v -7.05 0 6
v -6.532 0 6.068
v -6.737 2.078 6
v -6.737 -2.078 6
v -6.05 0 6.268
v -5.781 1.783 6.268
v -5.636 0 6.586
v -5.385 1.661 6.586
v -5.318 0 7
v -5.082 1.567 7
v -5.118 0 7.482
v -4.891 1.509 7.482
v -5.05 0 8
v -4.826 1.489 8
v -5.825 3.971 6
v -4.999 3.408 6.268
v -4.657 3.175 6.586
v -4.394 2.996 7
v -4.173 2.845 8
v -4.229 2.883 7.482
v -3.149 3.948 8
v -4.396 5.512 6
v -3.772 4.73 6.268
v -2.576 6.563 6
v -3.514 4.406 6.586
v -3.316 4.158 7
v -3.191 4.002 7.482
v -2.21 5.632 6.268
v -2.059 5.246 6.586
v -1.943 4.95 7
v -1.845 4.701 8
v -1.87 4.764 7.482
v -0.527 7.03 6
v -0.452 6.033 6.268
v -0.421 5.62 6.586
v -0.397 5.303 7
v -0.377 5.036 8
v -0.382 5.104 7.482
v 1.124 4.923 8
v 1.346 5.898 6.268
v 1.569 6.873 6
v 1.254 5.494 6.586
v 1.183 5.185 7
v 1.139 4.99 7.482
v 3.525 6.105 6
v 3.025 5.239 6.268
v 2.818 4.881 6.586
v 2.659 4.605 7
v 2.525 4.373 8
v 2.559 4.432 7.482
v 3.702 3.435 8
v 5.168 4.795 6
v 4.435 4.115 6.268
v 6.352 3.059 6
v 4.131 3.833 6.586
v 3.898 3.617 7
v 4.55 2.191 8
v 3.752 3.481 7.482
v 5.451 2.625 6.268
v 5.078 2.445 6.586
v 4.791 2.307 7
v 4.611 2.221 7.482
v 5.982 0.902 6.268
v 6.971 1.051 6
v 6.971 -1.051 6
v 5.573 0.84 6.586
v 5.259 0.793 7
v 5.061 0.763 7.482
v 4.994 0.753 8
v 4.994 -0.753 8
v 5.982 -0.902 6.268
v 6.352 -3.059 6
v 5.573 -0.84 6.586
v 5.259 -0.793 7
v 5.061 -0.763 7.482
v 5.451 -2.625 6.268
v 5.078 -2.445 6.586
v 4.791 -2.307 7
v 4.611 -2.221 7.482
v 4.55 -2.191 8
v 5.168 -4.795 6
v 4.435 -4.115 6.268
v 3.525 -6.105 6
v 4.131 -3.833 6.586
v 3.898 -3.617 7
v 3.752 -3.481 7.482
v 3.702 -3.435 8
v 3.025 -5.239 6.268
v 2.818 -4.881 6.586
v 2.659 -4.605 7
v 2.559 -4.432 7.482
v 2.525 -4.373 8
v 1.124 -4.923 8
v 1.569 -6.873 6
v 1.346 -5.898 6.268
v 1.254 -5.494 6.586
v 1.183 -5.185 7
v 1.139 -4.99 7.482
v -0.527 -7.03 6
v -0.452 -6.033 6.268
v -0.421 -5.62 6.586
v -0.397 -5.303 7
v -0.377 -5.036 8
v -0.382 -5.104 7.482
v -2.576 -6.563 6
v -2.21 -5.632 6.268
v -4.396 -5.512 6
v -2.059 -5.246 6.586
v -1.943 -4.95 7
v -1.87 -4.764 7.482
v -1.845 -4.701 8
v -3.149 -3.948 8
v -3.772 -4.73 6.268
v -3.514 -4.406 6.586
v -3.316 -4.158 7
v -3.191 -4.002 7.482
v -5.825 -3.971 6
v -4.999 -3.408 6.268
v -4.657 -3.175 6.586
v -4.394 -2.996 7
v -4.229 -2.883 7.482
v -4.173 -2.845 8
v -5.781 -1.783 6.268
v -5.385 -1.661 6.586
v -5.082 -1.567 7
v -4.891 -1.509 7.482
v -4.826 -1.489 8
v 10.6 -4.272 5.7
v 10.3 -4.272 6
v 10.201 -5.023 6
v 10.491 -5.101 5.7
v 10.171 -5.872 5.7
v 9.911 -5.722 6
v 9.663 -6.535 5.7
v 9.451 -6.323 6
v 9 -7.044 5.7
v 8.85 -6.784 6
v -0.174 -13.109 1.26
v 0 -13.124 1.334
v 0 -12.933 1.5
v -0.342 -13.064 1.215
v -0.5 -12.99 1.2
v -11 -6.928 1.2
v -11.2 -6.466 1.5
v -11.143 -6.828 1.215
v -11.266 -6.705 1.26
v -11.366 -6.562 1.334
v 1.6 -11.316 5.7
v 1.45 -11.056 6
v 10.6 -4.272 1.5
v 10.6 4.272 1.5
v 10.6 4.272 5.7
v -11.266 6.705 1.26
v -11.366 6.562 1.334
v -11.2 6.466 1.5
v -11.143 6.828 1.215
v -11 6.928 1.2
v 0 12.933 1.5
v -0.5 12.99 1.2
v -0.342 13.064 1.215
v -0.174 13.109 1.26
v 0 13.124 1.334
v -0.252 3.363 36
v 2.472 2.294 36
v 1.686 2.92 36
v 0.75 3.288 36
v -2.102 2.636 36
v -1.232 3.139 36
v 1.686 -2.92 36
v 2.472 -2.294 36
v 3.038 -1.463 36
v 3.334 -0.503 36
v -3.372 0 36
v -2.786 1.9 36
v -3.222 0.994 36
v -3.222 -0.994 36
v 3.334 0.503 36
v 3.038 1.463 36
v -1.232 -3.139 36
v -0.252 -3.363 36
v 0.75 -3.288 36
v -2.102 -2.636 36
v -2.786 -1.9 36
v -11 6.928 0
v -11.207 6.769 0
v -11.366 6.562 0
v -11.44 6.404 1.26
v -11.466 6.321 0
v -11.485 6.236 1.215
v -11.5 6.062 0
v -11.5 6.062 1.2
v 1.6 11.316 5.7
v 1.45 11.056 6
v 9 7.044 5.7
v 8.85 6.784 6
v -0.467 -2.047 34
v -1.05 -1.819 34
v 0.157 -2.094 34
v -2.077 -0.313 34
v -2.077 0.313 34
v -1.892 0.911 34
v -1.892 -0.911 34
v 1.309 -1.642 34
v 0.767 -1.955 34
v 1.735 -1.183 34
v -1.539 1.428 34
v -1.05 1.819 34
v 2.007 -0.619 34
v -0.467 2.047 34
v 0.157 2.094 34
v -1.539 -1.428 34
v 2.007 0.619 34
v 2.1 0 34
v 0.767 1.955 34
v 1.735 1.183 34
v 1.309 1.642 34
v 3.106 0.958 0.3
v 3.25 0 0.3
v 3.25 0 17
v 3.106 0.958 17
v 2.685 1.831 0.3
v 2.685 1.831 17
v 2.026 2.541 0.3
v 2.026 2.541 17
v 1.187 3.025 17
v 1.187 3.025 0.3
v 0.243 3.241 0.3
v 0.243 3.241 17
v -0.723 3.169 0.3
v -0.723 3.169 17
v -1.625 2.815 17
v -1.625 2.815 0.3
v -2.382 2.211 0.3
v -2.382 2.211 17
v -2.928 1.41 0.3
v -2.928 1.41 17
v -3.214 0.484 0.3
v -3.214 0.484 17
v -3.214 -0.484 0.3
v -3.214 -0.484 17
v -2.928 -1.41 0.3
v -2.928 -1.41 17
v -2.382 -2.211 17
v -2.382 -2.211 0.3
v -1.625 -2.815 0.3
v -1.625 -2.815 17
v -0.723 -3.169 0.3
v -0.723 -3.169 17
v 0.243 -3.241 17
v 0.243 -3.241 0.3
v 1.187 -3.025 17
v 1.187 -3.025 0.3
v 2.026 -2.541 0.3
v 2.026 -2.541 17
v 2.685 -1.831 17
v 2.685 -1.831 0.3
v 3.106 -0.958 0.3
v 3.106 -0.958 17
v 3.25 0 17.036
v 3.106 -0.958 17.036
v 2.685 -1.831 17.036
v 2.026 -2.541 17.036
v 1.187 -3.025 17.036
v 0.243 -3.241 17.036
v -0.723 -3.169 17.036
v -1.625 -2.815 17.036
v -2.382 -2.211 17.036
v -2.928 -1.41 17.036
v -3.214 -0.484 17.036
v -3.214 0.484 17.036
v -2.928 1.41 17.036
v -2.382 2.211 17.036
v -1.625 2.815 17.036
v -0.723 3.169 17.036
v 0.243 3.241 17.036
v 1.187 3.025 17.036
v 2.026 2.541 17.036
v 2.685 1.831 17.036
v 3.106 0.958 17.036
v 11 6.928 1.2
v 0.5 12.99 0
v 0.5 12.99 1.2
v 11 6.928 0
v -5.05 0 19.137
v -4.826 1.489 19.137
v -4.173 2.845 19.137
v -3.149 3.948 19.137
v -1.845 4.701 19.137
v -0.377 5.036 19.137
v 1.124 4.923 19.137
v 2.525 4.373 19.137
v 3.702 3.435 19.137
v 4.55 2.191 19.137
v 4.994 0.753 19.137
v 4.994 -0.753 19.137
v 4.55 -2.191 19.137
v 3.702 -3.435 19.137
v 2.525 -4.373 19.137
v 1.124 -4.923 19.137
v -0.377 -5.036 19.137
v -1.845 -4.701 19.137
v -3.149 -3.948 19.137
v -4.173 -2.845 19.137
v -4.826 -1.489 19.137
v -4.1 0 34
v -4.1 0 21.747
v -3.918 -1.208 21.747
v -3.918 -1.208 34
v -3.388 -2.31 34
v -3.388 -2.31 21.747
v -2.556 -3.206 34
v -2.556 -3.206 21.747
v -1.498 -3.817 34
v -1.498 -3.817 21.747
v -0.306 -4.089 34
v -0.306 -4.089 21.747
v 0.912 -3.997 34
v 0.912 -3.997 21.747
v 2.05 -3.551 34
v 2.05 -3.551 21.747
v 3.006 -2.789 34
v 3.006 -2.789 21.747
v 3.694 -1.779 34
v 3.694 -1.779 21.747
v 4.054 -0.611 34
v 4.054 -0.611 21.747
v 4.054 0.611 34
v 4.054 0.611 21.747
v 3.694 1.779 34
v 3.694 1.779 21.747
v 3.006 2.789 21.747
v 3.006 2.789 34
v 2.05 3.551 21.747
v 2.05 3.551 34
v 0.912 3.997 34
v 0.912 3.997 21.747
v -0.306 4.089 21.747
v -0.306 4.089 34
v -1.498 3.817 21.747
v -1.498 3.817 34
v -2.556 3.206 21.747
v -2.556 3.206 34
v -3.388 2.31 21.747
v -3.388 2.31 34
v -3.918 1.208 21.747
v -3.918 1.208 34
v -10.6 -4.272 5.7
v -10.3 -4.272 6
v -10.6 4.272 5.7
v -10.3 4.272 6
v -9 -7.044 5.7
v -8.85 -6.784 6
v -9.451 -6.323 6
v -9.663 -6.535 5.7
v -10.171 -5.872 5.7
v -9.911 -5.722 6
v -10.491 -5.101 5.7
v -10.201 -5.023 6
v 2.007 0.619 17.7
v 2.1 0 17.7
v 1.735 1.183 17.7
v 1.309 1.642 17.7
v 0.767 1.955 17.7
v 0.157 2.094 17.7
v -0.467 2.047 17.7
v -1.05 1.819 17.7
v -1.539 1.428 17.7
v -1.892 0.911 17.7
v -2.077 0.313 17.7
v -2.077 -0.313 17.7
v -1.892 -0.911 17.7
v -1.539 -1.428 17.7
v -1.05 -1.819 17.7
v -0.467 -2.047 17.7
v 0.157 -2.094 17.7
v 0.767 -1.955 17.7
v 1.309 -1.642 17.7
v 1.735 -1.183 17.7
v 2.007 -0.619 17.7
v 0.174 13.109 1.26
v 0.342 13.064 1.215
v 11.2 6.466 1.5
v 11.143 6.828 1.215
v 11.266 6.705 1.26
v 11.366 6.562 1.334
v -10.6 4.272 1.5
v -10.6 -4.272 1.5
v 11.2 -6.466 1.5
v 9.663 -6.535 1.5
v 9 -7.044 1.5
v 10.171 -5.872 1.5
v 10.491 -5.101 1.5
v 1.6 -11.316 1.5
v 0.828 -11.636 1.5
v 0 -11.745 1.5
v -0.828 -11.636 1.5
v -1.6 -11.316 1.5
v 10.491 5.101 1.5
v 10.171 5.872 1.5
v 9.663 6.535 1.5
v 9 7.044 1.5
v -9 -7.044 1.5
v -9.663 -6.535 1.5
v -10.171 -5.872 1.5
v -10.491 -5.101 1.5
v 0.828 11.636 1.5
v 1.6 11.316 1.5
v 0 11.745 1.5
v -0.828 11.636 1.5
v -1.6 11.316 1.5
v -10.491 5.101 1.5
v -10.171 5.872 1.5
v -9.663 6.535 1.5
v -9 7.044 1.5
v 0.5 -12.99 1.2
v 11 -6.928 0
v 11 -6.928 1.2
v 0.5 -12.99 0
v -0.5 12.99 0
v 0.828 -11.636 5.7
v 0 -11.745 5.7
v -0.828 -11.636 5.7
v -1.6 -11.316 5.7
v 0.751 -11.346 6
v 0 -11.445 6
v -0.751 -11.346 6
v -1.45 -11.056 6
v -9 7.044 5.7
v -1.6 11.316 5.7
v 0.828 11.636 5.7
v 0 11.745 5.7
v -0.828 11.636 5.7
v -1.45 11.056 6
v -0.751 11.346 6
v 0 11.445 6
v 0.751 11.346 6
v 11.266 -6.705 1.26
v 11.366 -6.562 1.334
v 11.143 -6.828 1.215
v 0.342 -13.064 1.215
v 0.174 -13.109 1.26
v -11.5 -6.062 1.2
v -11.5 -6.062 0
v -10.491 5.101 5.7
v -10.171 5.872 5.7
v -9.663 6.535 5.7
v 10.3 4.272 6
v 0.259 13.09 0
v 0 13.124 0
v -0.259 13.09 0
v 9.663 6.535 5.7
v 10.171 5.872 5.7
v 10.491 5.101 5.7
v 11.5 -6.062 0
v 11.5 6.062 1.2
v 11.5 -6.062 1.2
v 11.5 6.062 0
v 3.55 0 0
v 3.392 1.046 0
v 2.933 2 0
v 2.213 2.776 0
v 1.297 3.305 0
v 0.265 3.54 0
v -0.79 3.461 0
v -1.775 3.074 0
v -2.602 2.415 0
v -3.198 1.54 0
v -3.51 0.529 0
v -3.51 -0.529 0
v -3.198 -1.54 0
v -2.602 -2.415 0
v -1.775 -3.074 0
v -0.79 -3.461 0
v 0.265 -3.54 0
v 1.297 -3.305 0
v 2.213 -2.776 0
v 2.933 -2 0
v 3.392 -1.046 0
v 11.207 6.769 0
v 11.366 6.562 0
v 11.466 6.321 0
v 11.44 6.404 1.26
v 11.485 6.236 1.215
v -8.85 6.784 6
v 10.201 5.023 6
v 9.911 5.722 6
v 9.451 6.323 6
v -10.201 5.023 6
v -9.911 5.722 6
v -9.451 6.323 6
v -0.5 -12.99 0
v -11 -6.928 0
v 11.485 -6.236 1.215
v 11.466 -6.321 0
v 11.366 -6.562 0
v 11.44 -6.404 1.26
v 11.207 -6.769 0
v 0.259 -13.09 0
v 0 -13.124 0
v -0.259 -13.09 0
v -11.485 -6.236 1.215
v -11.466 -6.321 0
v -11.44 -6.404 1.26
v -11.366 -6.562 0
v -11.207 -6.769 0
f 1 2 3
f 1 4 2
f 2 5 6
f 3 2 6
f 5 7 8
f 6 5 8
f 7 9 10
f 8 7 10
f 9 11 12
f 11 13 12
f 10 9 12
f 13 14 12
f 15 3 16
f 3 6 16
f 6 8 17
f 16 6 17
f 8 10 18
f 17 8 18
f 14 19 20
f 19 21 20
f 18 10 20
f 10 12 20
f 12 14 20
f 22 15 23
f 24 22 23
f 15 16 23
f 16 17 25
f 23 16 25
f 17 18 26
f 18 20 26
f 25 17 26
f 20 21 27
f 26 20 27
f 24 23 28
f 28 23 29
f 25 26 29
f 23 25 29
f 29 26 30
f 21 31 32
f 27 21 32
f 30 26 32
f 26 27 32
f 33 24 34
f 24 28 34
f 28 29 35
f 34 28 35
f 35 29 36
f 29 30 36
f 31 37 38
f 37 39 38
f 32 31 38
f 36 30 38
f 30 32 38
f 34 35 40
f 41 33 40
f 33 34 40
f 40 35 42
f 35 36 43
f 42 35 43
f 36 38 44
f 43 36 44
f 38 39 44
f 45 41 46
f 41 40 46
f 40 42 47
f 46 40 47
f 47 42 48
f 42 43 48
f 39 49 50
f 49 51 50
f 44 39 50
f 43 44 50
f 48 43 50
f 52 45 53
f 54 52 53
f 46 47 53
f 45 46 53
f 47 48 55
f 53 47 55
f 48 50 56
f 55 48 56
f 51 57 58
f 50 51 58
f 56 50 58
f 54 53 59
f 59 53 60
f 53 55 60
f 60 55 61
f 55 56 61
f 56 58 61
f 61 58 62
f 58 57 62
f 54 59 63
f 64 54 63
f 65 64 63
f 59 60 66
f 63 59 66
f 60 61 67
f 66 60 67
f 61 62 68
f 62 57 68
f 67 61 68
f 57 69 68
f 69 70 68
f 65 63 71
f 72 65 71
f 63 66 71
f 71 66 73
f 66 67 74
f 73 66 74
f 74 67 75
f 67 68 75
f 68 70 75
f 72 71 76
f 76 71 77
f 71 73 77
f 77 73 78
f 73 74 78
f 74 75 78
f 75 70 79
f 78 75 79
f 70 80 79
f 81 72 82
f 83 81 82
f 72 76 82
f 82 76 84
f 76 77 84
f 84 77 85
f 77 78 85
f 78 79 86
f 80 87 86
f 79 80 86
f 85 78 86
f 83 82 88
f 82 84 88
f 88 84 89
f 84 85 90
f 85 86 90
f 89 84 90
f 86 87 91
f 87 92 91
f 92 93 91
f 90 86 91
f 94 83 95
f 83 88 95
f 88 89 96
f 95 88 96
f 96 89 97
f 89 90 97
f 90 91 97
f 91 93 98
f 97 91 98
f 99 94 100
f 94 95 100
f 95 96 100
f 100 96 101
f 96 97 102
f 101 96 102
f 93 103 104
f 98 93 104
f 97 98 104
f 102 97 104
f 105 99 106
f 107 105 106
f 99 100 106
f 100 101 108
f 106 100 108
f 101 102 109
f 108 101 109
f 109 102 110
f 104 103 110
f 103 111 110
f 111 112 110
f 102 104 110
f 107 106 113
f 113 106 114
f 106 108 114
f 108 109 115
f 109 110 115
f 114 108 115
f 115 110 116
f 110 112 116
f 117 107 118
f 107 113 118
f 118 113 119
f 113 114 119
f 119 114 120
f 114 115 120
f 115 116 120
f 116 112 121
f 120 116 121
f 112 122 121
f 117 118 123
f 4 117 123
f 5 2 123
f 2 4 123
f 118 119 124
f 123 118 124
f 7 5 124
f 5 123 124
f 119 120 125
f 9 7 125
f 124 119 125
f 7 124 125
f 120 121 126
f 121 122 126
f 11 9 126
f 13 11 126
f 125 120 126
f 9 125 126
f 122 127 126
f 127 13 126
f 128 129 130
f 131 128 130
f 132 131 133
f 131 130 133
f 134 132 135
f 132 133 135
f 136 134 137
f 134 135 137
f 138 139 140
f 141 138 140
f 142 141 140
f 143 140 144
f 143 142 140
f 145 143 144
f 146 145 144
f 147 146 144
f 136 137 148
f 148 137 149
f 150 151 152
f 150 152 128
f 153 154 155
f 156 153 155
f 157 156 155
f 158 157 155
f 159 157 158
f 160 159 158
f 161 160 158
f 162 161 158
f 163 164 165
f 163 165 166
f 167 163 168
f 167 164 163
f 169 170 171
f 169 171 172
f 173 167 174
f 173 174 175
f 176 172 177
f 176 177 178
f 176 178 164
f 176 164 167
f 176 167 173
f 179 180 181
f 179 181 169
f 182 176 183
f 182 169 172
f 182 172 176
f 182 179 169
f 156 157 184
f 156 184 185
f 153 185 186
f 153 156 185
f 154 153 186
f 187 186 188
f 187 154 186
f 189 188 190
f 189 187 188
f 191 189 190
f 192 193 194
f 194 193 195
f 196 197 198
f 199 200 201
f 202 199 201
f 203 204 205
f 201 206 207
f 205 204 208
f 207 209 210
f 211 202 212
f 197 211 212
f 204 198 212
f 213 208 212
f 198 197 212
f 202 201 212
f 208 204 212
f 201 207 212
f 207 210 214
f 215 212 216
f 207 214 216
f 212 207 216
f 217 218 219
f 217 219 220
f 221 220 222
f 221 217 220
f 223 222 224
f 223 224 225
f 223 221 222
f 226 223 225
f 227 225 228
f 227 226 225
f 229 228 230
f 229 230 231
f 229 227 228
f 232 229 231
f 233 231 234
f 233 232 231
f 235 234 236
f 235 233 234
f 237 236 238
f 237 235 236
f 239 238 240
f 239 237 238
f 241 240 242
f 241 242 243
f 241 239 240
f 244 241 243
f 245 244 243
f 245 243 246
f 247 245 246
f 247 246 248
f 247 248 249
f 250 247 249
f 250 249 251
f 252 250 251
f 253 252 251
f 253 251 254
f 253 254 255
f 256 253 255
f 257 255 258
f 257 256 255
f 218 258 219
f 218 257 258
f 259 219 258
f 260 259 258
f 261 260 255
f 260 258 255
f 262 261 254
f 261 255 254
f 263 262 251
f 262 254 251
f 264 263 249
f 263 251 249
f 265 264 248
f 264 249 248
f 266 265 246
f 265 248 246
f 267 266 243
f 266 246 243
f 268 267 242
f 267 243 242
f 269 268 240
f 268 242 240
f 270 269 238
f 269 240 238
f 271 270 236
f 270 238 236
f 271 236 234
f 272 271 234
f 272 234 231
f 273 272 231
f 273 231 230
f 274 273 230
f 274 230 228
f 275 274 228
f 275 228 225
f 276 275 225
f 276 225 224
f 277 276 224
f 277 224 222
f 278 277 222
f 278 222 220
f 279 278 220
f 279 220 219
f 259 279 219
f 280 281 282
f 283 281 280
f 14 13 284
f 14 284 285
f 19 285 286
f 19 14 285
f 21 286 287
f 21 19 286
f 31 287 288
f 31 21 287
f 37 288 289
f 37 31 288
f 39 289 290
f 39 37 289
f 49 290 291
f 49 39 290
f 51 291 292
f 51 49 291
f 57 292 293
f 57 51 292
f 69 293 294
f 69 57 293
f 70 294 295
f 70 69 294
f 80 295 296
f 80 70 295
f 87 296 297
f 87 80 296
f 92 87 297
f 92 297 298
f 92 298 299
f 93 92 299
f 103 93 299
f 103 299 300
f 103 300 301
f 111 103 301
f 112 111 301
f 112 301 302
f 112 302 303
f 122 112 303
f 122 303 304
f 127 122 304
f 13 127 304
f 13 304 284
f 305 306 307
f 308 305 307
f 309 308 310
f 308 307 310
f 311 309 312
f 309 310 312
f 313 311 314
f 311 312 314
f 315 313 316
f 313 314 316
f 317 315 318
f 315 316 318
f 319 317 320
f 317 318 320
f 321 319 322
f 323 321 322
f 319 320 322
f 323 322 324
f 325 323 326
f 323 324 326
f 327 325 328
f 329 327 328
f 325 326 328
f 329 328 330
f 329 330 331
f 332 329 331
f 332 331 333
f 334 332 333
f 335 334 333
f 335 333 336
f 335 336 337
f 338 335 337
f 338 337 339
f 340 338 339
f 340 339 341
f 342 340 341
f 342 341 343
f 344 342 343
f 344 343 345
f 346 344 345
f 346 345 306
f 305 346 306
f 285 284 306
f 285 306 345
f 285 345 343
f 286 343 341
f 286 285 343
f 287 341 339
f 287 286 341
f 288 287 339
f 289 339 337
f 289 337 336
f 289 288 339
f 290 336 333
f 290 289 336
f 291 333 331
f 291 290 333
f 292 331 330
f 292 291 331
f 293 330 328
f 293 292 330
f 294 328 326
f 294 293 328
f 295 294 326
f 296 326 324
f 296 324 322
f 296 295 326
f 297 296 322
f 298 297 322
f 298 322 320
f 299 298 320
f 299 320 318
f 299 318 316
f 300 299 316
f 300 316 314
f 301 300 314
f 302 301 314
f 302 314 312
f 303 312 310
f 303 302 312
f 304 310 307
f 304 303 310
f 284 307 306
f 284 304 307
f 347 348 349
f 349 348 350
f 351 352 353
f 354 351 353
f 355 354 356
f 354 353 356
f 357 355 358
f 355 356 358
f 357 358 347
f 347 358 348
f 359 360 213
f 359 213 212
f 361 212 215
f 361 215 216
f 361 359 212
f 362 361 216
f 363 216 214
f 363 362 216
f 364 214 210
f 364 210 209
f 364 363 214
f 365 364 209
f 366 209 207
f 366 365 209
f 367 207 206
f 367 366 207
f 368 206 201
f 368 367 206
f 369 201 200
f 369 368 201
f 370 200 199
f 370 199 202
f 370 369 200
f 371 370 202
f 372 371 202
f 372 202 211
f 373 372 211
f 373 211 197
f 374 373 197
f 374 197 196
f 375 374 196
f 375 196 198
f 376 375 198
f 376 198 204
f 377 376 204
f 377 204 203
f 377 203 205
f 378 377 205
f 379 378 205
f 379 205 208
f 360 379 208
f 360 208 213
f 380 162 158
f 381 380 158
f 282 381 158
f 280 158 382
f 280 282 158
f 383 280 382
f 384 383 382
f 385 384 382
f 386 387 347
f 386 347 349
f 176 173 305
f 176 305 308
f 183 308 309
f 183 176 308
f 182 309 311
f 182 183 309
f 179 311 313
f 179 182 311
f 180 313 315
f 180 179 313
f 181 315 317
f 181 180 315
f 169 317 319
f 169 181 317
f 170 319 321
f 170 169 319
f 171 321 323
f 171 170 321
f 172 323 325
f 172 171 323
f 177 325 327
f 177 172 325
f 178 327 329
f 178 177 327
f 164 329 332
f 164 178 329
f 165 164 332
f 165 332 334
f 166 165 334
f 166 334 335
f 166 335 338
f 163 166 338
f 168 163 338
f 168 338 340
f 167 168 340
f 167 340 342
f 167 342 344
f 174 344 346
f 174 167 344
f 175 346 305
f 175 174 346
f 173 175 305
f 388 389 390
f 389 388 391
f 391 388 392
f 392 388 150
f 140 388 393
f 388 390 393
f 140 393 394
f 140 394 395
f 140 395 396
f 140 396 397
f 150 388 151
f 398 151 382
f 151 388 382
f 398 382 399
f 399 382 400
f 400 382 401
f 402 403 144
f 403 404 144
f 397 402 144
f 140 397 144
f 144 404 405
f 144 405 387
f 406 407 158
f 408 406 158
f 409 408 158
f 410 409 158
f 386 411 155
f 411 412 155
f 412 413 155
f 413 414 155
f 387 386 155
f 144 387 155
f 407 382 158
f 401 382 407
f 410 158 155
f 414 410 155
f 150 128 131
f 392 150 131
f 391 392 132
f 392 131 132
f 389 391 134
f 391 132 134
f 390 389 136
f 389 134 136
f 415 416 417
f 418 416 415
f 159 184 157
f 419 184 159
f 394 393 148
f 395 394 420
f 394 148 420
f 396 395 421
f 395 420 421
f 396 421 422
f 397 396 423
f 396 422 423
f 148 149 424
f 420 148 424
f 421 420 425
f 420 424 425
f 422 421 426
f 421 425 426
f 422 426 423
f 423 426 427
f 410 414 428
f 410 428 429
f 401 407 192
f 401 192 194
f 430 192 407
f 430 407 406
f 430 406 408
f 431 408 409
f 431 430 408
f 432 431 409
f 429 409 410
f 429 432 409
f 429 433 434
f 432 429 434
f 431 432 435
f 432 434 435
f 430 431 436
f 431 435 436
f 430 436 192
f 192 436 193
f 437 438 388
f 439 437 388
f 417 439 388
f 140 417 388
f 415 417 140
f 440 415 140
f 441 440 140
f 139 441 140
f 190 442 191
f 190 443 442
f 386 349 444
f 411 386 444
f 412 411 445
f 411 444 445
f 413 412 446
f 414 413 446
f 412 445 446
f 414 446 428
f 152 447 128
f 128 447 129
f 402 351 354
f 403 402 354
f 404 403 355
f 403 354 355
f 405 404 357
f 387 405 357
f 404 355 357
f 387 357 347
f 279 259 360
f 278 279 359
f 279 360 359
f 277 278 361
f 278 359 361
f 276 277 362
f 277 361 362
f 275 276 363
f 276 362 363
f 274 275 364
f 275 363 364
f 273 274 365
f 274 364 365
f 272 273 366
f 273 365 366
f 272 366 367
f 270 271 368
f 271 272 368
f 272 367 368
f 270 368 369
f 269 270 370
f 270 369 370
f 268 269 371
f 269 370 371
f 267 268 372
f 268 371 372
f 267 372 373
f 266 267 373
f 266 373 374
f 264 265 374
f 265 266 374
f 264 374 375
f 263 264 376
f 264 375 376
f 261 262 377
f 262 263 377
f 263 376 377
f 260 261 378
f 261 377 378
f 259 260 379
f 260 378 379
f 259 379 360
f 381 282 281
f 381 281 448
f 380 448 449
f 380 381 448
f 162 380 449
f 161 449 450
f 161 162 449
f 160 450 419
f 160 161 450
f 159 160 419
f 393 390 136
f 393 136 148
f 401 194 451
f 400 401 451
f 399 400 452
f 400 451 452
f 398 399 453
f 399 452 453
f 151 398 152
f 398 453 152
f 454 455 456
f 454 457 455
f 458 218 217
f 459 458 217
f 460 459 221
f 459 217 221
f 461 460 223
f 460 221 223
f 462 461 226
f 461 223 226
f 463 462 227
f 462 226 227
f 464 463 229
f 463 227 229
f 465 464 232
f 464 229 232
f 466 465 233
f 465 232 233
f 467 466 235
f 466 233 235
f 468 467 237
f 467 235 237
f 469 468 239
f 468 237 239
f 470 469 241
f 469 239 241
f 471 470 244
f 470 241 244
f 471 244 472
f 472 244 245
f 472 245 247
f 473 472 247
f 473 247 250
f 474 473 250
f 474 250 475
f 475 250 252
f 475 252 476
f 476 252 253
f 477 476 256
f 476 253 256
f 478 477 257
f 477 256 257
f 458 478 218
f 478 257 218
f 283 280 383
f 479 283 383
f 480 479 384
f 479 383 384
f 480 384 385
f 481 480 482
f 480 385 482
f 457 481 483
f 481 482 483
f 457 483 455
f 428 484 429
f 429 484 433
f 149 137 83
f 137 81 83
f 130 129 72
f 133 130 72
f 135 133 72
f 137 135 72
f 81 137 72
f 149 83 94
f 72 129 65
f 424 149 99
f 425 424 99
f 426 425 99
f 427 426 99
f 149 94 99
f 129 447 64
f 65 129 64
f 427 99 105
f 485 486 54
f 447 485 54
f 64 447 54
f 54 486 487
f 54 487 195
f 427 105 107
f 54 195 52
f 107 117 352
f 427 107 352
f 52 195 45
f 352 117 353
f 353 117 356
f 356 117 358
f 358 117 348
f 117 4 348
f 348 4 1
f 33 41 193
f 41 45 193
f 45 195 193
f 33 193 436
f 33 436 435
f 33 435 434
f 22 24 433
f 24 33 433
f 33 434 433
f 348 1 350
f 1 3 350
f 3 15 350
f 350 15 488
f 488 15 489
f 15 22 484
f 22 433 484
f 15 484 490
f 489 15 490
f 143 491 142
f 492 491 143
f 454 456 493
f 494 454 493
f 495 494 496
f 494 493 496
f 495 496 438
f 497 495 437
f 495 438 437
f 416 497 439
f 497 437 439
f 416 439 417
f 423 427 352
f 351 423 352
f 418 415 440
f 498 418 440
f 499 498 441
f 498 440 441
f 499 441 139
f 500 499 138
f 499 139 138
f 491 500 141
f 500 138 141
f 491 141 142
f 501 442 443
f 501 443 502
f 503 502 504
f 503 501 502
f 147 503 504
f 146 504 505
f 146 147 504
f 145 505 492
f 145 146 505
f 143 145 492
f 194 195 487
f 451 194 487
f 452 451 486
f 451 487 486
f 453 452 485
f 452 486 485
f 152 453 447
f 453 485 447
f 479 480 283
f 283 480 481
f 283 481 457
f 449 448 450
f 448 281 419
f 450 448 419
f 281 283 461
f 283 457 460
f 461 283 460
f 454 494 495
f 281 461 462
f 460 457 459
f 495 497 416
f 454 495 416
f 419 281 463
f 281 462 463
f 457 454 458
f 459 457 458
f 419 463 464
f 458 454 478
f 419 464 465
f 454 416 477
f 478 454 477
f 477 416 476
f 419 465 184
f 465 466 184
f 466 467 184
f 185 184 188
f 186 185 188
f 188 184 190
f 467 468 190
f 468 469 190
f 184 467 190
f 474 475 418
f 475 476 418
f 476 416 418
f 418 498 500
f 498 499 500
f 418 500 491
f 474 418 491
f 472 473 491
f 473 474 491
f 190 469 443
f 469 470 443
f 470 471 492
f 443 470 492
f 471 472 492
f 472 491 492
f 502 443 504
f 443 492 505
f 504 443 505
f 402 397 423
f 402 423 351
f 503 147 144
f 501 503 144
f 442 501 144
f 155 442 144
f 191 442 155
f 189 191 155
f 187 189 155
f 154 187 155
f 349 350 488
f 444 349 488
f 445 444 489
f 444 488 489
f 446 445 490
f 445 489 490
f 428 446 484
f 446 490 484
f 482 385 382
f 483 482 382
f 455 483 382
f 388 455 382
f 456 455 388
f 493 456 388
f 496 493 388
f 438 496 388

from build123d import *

# Parameters (mm, degrees)
BOSS_EXTRUDE1_DEPTH  = 1.5
SKETCH1_8_R          = 4.1
BOSS_EXTRUDE3_DEPTH  = 36
SKETCH1_9_R          = 5.05
BOSS_EXTRUDE4_DEPTH  = 19
SHELL1_START         = 2
SHELL1_OUTLINE_R     = 2.1
SHELL1_DEPTH         = 32
SHELL1_2_OUTLINE_R   = 3.05
SHELL1_2_OUTLINE_R_2 = 2.1
SHELL1_2_DEPTH       = 15
SKETCH1_10_R         = 3.25
CUT_EXTRUDE1_DEPTH   = 17
SKETCH1_3_R          = 3.25
BOSS_EXTRUDE2_DEPTH  = 6
CHAMFER1_SIZE        = 2
CHAMFER1_SIZE2       = 0.727940469
CHAMFER2_SIZE        = 2.747477419
CHAMFER2_SIZE_2      = 1
CHAMFER3_SIZE        = 1.212435565
CHAMFER3_SIZE_2      = 0.7
CHAMFER6_SIZE        = 0.3
FILLET1_R            = 3.2
CHAMFER5_SIZE        = 0.3
FILLET2_R            = 1
FILLET3_R            = 2


# Read off the part's stored shape, not the designer's step: Shell1
with BuildPart() as part:
    # Sketch1 → Boss-Extrude1 (new body)
    with BuildSketch(Plane.XY):
        Polygon((-11.5, 6.639528096), (0, 13.279056191), (11.5, 6.639528096), (11.5, -6.639528096), (0, -13.279056191), (-11.5, -6.639528096), align=None)
    extrude(amount=BOSS_EXTRUDE1_DEPTH)

    # Sketch1<8> → Boss-Extrude3 (add)
    with BuildSketch(Plane.XY):
        with Locations(Location((0, 0, 0), (0, 0, 180))):
            Circle(SKETCH1_8_R)
    extrude(amount=BOSS_EXTRUDE3_DEPTH)

    # Sketch1<9> → Boss-Extrude4 (add)
    with BuildSketch(Plane.XY):
        with Locations(Location((0, 0, 0), (0, 0, 180))):
            Circle(SKETCH1_9_R)
    extrude(amount=BOSS_EXTRUDE4_DEPTH)

    # Shell1 outline → Shell1 (cut)
    with BuildSketch(Plane.XY.offset(SHELL1_START)):
        Circle(SHELL1_OUTLINE_R)
    extrude(amount=SHELL1_DEPTH, mode=Mode.SUBTRACT)

    # Shell1 2 outline → Shell1 2 (cut)
    with BuildSketch(Plane.XY.offset(SHELL1_START)):
        Circle(SHELL1_2_OUTLINE_R)
        Circle(SHELL1_2_OUTLINE_R_2, mode=Mode.SUBTRACT)
    extrude(amount=SHELL1_2_DEPTH, mode=Mode.SUBTRACT)

    # Sketch1<10> → Cut-Extrude1 (cut)
    with BuildSketch(Plane.XY):
        Circle(SKETCH1_10_R)
    extrude(amount=CUT_EXTRUDE1_DEPTH, mode=Mode.SUBTRACT)

    # Sketch1<3> → Boss-Extrude2 (add)
    with BuildSketch(Plane.XY):
        Polygon((0, 12.239825707), (10.6, 6.119912853), (10.6, -6.119912853), (0, -12.239825707), (-10.6, -6.119912853), (-10.6, 6.119912853), align=None)
        Circle(SKETCH1_3_R, mode=Mode.SUBTRACT)
    extrude(amount=BOSS_EXTRUDE2_DEPTH)

    # Chamfer1
    chamfer1_edges = [part.edges().sort_by_distance(p)[0] for p in [
        (4.1, 0, 36),
    ]]
    chamfer1_side = [part.faces().sort_by_distance(p)[0] for p in [
        (4.1, 0, 27.5),
    ]]
    chamfer(chamfer1_edges, length=CHAMFER1_SIZE, length2=CHAMFER1_SIZE2, reference=chamfer1_side[0])

    # Chamfer2
    # the kernel refuses this chamfer: 2.747477419, 1 mm, written as the material it adds along each edge
    with BuildSketch(Plane(origin=(0, 0, 19), x_dir=(-1, 0, 0), z_dir=(0, -1, 0))) as chamfer2_piece_1_section:
        Polygon((4.1, -CHAMFER2_SIZE), (4.1 + CHAMFER2_SIZE_2, 0), (4.1, 0), align=None)
    chamfer2_piece_1 = revolve(axis=Axis((0, 0, 19), (0, 0, -1)), mode=Mode.PRIVATE)
    chamfer2_piece_1 = chamfer2_piece_1 & Plane(origin=(0, 0, 20.481947897), x_dir=(-1, 0, 0), z_dir=(0, 0, -1)) * Cylinder(5.05, 21, mode=Mode.PRIVATE)
    add(chamfer2_piece_1)

    # Chamfer3
    # the kernel refuses this chamfer: 1.212435565, 0.7 mm, written as the material it takes off along each edge
    with BuildSketch(Plane(origin=(0, 0, 17), x_dir=(1, 0, 0), z_dir=(0, -1, 0))) as chamfer3_piece_1_section:
        Polygon((2.1 + CHAMFER3_SIZE, 0), (2.1, CHAMFER3_SIZE_2), (2.1, 0), align=None)
    chamfer3_piece_1 = revolve(axis=Axis((0, 0, 17), (0, 0, 1)), mode=Mode.PRIVATE)
    chamfer3_piece_1 = chamfer3_piece_1 & Plane(origin=(0, 0, 17.363214185), x_dir=(1, 0, 0), z_dir=(0, 0, -1)) * Cylinder(3.25, 14, mode=Mode.PRIVATE)
    add(chamfer3_piece_1, mode=Mode.SUBTRACT)

    # Chamfer6
    chamfer6_edges = [part.edges().sort_by_distance(p)[0] for p in [
        (-3.25, 0, 0),
    ]]
    chamfer(chamfer6_edges, length=CHAMFER6_SIZE)

    # Fillet1
    fillet1_edges = [part.edges().sort_by_distance(p)[0] for p in [
        (-10.6, -6.119912853, 3.75),
        (0, -12.239825707, 3.75),
        (10.6, -6.119912853, 3.75),
        (10.6, 6.119912853, 3.75),
        (0, 12.239825707, 3.75),
        (-10.6, 6.119912853, 3.75),
    ]]
    fillet(fillet1_edges, radius=FILLET1_R)

    # Chamfer5
    chamfer5_edges = [part.edges().sort_by_distance(p)[0] for p in [
        (-5.3, -9.17986928, 6),
        (5.3, 9.17986928, 6),
        (-5.3, 9.17986928, 6),
        (-10.6, 0, 6),
        (10.171281292, 5.872391992, 6),
        (0, 11.744783984, 6),
        (-10.171281292, 5.872391992, 6),
        (-10.171281292, -5.872391992, 6),
        (0, -11.744783984, 6),
        (10.171281292, -5.872391992, 6),
        (5.75, 9.959292144, 1.5),
        (11.5, 0, 1.5),
        (5.75, -9.959292144, 1.5),
        (-5.75, -9.959292144, 1.5),
        (-11.5, 0, 1.5),
        (-5.75, 9.959292144, 1.5),
        (10.6, 0, 6),
        (5.3, -9.17986928, 6),
    ]]
    chamfer(chamfer5_edges, length=CHAMFER5_SIZE)

    # Fillet2
    fillet2_edges = [part.edges().sort_by_distance(p)[0] for p in [
        (11.5, 6.639528096, 0.6),
        (11.5, -6.639528096, 0.6),
        (0, -13.279056191, 0.6),
        (-11.5, -6.639528096, 0.6),
        (-11.5, 6.639528096, 0.6),
        (0, 13.279056191, 0.6),
    ]]
    fillet(fillet2_edges, radius=FILLET2_R)

    # Fillet3
    fillet3_edges = [part.edges().sort_by_distance(p)[0] for p in [
        (5.05, 0, 6),
    ]]
    fillet(fillet3_edges, radius=FILLET3_R)


solid = part.part
